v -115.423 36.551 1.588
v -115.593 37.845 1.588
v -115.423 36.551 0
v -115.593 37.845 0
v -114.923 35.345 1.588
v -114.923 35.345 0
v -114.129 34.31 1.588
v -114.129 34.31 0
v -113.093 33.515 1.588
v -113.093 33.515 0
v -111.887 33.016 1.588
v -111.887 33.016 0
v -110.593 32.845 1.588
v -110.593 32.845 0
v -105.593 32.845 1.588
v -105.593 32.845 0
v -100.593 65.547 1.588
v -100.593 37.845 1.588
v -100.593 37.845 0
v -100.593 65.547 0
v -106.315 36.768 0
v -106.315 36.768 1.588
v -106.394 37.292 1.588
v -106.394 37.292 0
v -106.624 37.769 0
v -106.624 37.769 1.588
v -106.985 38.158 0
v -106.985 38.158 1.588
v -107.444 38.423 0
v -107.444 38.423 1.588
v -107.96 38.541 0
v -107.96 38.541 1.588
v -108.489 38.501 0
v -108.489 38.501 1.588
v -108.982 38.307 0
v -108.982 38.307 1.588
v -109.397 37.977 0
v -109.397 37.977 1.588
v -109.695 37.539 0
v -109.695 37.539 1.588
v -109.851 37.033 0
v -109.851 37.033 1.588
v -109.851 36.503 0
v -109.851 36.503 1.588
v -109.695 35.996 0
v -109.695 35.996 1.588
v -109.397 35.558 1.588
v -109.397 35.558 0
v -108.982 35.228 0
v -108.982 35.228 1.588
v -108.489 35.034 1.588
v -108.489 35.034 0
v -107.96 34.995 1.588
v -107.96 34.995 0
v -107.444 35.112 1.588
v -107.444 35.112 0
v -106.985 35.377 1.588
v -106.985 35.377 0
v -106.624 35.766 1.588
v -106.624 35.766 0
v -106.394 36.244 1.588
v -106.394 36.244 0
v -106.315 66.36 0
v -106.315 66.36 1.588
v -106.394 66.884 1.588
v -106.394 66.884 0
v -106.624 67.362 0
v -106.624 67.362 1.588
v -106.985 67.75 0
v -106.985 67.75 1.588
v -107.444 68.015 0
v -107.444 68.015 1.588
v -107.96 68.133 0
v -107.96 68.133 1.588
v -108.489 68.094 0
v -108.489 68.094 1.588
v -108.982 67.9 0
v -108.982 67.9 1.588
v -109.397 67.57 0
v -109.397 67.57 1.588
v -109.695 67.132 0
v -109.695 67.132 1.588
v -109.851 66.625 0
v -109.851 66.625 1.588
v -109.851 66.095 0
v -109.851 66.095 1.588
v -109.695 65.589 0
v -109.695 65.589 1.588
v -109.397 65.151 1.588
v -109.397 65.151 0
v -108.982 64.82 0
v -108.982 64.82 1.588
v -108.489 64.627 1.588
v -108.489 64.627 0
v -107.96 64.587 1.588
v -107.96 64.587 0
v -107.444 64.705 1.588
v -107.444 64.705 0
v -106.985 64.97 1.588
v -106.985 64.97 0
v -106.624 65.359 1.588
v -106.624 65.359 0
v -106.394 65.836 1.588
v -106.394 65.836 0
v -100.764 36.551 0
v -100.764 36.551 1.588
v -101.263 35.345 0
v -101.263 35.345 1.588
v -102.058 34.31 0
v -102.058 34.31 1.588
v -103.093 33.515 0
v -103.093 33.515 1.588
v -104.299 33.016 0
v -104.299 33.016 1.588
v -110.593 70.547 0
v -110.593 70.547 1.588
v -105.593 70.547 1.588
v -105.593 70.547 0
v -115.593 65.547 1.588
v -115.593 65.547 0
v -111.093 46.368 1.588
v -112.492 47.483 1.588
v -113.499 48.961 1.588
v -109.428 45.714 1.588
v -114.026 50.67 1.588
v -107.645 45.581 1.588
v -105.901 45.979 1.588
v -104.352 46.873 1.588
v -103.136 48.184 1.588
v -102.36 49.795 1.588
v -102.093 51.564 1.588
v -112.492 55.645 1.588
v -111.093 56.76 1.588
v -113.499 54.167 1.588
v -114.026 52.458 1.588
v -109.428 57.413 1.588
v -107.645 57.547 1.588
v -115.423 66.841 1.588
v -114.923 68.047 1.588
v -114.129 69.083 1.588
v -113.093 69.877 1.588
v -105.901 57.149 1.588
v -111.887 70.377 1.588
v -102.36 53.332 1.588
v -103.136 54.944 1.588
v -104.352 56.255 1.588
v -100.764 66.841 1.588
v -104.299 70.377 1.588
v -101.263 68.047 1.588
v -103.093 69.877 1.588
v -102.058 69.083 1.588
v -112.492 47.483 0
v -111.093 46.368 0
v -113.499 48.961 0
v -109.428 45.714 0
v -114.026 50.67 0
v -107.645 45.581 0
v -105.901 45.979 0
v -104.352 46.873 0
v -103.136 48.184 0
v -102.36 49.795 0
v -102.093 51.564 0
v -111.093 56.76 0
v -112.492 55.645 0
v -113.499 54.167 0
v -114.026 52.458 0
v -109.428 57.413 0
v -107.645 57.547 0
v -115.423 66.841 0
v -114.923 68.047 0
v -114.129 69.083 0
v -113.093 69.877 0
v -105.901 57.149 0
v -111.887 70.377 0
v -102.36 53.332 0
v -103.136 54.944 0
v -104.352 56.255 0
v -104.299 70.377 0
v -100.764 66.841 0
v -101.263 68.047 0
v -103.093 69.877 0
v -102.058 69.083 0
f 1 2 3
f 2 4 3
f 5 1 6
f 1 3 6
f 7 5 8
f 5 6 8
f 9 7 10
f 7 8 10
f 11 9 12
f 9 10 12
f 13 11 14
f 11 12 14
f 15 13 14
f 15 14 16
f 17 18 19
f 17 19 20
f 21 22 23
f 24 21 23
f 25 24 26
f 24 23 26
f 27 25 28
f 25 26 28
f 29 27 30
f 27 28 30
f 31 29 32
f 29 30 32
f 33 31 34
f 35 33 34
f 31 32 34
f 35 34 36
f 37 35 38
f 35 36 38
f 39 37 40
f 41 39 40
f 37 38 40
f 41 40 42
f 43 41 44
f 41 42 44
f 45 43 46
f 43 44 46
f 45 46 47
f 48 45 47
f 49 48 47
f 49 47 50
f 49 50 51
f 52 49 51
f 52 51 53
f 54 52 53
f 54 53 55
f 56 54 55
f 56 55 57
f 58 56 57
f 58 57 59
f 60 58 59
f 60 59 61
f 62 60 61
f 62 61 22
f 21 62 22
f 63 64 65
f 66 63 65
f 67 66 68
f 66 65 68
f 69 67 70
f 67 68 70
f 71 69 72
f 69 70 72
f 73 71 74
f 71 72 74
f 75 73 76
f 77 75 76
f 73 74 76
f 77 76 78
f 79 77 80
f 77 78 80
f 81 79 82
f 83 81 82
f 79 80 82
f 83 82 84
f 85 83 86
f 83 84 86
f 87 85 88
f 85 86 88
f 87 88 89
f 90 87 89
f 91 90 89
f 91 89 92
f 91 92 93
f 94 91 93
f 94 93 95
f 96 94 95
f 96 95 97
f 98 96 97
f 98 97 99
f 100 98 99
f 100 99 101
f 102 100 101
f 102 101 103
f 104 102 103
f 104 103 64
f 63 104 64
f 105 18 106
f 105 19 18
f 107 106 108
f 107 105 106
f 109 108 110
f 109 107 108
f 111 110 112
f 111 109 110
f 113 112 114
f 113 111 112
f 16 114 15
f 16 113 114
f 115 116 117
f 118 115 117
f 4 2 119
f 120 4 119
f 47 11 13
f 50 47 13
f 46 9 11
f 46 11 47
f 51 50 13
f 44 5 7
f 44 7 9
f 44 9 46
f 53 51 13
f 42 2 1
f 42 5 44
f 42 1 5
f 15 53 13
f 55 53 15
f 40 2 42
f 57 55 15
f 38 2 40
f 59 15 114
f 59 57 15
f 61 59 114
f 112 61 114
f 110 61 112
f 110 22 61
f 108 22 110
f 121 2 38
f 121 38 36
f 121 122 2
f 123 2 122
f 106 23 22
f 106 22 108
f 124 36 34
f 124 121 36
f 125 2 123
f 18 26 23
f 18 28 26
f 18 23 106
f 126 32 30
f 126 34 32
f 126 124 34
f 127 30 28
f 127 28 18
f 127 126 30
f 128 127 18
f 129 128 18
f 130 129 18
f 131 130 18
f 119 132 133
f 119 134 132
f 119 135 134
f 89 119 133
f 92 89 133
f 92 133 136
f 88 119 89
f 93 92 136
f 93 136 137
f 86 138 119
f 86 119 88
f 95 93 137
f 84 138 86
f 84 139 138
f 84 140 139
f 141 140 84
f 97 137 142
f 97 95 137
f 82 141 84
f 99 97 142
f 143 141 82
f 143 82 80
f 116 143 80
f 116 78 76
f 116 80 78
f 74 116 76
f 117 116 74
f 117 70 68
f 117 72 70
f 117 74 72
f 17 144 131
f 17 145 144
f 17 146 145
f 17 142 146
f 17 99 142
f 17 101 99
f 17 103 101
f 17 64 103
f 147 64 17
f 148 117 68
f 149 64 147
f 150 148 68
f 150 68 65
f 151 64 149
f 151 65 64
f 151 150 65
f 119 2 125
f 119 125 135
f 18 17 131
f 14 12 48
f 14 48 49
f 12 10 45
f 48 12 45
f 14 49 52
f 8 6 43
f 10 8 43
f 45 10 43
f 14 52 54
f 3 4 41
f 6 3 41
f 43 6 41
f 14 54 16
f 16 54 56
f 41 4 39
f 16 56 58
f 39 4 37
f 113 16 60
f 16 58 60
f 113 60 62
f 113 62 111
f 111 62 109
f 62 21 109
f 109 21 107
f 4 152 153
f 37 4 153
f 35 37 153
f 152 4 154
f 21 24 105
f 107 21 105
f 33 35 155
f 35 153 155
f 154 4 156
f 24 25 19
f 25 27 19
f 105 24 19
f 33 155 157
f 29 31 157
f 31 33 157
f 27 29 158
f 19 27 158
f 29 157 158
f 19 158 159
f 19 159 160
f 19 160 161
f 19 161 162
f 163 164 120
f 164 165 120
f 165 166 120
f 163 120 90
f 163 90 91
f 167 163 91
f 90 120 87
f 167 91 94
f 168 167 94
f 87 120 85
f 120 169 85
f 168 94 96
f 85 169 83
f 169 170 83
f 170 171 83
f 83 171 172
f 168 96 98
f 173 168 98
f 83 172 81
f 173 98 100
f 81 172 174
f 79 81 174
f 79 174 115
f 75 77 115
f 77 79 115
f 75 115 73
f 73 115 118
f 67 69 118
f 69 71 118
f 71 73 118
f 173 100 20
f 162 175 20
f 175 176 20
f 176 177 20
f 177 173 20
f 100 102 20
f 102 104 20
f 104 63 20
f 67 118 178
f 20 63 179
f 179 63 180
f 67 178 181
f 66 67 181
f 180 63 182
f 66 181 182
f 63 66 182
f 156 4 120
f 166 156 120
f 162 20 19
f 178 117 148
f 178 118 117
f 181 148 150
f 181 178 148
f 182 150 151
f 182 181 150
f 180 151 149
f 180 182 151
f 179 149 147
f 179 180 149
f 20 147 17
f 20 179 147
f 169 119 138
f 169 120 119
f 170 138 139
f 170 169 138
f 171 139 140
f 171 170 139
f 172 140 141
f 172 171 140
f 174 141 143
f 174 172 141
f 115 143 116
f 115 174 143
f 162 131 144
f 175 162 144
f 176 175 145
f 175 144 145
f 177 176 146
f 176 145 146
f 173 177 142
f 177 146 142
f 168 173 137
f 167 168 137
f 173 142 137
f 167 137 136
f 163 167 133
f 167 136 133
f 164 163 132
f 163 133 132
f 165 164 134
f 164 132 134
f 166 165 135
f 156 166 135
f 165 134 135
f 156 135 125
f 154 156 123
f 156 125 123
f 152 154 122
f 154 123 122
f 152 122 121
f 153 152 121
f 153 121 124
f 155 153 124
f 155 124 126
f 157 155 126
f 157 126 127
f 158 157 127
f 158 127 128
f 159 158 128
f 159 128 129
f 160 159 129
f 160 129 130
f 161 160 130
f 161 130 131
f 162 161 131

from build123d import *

# Parameters (mm, degrees)
SKETCH1_W           = 101.6
SKETCH1_H           = 101.6
BOSS_EXTRUDE1_DEPTH = 1.5875
SKETCH2_R           = 5.999999938
CUT_EXTRUDE1_DEPTH  = 190.018384556
SKETCH4_R           = 1.778
CUT_EXTRUDE2_DEPTH  = 190.018384556
SKETCH5_W           = 43.3
SKETCH5_H           = 101.6
CUT_EXTRUDE4_DEPTH  = 190.018384556
SKETCH10_W          = 15
SKETCH10_H          = 31.816690228
SKETCH10_H_2        = 32.081483739
CUT_EXTRUDE5_DEPTH  = 155.410769427
FILLET1_R           = 5


with BuildPart() as part:
    # Sketch1 → Boss-Extrude1 (new body)
    with BuildSketch(Plane.XY):
        with Locations((-108.093233083, 51.563909774)):
            Rectangle(SKETCH1_W, SKETCH1_H)
    extrude(amount=BOSS_EXTRUDE1_DEPTH)

    # Sketch2 → Cut-Extrude1 (cut, through all)
    with BuildSketch(Plane.XY.offset(1.5875)):
        with Locations((-108.093233083, 51.563909774)):
            Circle(SKETCH2_R)
    extrude(amount=-CUT_EXTRUDE1_DEPTH, mode=Mode.SUBTRACT)

    # Sketch4 → Cut-Extrude2 (cut, through all)
    with BuildSketch(Plane.XY.offset(1.5875)):
        with Locations((-108.093233083, 66.360241624)):
            Circle(SKETCH4_R)
        with Locations((-108.093233083, 36.767577924)):
            Circle(SKETCH4_R)
    extrude(amount=-CUT_EXTRUDE2_DEPTH, mode=Mode.SUBTRACT)

    # Sketch5 → Cut-Extrude4 (cut, through all)
    with BuildSketch(Plane.XY.offset(1.5875)):
        with Locations((-137.243233083, 51.563909774)):
            Rectangle(SKETCH5_W, SKETCH5_H)
        with Locations((-78.943233083, 51.563909774)):
            Rectangle(SKETCH5_W, SKETCH5_H)
    extrude(amount=-CUT_EXTRUDE4_DEPTH, mode=Mode.SUBTRACT)

    # Sketch10 → Cut-Extrude5 (cut, through all)
    with BuildSketch(Plane.XY.offset(1.5875)):
        with Locations((-108.093233083, 86.45556466)):
            Rectangle(SKETCH10_W, SKETCH10_H)
        with Locations((-108.093233083, 16.804651644)):
            Rectangle(SKETCH10_W, SKETCH10_H_2)
    extrude(amount=-CUT_EXTRUDE5_DEPTH, mode=Mode.SUBTRACT)

    # Fillet1
    fillet1_edges = [part.edges().sort_by_distance(p)[0] for p in [
        (-115.593233083, 70.547219546, 0.79375),
        (-100.593233083, 70.547219546, 0.79375),
        (-100.593233083, 32.845393513, 0.79375),
        (-115.593233083, 32.845393513, 0.79375),
    ]]
    fillet(fillet1_edges, radius=FILLET1_R)


solid = part.part
